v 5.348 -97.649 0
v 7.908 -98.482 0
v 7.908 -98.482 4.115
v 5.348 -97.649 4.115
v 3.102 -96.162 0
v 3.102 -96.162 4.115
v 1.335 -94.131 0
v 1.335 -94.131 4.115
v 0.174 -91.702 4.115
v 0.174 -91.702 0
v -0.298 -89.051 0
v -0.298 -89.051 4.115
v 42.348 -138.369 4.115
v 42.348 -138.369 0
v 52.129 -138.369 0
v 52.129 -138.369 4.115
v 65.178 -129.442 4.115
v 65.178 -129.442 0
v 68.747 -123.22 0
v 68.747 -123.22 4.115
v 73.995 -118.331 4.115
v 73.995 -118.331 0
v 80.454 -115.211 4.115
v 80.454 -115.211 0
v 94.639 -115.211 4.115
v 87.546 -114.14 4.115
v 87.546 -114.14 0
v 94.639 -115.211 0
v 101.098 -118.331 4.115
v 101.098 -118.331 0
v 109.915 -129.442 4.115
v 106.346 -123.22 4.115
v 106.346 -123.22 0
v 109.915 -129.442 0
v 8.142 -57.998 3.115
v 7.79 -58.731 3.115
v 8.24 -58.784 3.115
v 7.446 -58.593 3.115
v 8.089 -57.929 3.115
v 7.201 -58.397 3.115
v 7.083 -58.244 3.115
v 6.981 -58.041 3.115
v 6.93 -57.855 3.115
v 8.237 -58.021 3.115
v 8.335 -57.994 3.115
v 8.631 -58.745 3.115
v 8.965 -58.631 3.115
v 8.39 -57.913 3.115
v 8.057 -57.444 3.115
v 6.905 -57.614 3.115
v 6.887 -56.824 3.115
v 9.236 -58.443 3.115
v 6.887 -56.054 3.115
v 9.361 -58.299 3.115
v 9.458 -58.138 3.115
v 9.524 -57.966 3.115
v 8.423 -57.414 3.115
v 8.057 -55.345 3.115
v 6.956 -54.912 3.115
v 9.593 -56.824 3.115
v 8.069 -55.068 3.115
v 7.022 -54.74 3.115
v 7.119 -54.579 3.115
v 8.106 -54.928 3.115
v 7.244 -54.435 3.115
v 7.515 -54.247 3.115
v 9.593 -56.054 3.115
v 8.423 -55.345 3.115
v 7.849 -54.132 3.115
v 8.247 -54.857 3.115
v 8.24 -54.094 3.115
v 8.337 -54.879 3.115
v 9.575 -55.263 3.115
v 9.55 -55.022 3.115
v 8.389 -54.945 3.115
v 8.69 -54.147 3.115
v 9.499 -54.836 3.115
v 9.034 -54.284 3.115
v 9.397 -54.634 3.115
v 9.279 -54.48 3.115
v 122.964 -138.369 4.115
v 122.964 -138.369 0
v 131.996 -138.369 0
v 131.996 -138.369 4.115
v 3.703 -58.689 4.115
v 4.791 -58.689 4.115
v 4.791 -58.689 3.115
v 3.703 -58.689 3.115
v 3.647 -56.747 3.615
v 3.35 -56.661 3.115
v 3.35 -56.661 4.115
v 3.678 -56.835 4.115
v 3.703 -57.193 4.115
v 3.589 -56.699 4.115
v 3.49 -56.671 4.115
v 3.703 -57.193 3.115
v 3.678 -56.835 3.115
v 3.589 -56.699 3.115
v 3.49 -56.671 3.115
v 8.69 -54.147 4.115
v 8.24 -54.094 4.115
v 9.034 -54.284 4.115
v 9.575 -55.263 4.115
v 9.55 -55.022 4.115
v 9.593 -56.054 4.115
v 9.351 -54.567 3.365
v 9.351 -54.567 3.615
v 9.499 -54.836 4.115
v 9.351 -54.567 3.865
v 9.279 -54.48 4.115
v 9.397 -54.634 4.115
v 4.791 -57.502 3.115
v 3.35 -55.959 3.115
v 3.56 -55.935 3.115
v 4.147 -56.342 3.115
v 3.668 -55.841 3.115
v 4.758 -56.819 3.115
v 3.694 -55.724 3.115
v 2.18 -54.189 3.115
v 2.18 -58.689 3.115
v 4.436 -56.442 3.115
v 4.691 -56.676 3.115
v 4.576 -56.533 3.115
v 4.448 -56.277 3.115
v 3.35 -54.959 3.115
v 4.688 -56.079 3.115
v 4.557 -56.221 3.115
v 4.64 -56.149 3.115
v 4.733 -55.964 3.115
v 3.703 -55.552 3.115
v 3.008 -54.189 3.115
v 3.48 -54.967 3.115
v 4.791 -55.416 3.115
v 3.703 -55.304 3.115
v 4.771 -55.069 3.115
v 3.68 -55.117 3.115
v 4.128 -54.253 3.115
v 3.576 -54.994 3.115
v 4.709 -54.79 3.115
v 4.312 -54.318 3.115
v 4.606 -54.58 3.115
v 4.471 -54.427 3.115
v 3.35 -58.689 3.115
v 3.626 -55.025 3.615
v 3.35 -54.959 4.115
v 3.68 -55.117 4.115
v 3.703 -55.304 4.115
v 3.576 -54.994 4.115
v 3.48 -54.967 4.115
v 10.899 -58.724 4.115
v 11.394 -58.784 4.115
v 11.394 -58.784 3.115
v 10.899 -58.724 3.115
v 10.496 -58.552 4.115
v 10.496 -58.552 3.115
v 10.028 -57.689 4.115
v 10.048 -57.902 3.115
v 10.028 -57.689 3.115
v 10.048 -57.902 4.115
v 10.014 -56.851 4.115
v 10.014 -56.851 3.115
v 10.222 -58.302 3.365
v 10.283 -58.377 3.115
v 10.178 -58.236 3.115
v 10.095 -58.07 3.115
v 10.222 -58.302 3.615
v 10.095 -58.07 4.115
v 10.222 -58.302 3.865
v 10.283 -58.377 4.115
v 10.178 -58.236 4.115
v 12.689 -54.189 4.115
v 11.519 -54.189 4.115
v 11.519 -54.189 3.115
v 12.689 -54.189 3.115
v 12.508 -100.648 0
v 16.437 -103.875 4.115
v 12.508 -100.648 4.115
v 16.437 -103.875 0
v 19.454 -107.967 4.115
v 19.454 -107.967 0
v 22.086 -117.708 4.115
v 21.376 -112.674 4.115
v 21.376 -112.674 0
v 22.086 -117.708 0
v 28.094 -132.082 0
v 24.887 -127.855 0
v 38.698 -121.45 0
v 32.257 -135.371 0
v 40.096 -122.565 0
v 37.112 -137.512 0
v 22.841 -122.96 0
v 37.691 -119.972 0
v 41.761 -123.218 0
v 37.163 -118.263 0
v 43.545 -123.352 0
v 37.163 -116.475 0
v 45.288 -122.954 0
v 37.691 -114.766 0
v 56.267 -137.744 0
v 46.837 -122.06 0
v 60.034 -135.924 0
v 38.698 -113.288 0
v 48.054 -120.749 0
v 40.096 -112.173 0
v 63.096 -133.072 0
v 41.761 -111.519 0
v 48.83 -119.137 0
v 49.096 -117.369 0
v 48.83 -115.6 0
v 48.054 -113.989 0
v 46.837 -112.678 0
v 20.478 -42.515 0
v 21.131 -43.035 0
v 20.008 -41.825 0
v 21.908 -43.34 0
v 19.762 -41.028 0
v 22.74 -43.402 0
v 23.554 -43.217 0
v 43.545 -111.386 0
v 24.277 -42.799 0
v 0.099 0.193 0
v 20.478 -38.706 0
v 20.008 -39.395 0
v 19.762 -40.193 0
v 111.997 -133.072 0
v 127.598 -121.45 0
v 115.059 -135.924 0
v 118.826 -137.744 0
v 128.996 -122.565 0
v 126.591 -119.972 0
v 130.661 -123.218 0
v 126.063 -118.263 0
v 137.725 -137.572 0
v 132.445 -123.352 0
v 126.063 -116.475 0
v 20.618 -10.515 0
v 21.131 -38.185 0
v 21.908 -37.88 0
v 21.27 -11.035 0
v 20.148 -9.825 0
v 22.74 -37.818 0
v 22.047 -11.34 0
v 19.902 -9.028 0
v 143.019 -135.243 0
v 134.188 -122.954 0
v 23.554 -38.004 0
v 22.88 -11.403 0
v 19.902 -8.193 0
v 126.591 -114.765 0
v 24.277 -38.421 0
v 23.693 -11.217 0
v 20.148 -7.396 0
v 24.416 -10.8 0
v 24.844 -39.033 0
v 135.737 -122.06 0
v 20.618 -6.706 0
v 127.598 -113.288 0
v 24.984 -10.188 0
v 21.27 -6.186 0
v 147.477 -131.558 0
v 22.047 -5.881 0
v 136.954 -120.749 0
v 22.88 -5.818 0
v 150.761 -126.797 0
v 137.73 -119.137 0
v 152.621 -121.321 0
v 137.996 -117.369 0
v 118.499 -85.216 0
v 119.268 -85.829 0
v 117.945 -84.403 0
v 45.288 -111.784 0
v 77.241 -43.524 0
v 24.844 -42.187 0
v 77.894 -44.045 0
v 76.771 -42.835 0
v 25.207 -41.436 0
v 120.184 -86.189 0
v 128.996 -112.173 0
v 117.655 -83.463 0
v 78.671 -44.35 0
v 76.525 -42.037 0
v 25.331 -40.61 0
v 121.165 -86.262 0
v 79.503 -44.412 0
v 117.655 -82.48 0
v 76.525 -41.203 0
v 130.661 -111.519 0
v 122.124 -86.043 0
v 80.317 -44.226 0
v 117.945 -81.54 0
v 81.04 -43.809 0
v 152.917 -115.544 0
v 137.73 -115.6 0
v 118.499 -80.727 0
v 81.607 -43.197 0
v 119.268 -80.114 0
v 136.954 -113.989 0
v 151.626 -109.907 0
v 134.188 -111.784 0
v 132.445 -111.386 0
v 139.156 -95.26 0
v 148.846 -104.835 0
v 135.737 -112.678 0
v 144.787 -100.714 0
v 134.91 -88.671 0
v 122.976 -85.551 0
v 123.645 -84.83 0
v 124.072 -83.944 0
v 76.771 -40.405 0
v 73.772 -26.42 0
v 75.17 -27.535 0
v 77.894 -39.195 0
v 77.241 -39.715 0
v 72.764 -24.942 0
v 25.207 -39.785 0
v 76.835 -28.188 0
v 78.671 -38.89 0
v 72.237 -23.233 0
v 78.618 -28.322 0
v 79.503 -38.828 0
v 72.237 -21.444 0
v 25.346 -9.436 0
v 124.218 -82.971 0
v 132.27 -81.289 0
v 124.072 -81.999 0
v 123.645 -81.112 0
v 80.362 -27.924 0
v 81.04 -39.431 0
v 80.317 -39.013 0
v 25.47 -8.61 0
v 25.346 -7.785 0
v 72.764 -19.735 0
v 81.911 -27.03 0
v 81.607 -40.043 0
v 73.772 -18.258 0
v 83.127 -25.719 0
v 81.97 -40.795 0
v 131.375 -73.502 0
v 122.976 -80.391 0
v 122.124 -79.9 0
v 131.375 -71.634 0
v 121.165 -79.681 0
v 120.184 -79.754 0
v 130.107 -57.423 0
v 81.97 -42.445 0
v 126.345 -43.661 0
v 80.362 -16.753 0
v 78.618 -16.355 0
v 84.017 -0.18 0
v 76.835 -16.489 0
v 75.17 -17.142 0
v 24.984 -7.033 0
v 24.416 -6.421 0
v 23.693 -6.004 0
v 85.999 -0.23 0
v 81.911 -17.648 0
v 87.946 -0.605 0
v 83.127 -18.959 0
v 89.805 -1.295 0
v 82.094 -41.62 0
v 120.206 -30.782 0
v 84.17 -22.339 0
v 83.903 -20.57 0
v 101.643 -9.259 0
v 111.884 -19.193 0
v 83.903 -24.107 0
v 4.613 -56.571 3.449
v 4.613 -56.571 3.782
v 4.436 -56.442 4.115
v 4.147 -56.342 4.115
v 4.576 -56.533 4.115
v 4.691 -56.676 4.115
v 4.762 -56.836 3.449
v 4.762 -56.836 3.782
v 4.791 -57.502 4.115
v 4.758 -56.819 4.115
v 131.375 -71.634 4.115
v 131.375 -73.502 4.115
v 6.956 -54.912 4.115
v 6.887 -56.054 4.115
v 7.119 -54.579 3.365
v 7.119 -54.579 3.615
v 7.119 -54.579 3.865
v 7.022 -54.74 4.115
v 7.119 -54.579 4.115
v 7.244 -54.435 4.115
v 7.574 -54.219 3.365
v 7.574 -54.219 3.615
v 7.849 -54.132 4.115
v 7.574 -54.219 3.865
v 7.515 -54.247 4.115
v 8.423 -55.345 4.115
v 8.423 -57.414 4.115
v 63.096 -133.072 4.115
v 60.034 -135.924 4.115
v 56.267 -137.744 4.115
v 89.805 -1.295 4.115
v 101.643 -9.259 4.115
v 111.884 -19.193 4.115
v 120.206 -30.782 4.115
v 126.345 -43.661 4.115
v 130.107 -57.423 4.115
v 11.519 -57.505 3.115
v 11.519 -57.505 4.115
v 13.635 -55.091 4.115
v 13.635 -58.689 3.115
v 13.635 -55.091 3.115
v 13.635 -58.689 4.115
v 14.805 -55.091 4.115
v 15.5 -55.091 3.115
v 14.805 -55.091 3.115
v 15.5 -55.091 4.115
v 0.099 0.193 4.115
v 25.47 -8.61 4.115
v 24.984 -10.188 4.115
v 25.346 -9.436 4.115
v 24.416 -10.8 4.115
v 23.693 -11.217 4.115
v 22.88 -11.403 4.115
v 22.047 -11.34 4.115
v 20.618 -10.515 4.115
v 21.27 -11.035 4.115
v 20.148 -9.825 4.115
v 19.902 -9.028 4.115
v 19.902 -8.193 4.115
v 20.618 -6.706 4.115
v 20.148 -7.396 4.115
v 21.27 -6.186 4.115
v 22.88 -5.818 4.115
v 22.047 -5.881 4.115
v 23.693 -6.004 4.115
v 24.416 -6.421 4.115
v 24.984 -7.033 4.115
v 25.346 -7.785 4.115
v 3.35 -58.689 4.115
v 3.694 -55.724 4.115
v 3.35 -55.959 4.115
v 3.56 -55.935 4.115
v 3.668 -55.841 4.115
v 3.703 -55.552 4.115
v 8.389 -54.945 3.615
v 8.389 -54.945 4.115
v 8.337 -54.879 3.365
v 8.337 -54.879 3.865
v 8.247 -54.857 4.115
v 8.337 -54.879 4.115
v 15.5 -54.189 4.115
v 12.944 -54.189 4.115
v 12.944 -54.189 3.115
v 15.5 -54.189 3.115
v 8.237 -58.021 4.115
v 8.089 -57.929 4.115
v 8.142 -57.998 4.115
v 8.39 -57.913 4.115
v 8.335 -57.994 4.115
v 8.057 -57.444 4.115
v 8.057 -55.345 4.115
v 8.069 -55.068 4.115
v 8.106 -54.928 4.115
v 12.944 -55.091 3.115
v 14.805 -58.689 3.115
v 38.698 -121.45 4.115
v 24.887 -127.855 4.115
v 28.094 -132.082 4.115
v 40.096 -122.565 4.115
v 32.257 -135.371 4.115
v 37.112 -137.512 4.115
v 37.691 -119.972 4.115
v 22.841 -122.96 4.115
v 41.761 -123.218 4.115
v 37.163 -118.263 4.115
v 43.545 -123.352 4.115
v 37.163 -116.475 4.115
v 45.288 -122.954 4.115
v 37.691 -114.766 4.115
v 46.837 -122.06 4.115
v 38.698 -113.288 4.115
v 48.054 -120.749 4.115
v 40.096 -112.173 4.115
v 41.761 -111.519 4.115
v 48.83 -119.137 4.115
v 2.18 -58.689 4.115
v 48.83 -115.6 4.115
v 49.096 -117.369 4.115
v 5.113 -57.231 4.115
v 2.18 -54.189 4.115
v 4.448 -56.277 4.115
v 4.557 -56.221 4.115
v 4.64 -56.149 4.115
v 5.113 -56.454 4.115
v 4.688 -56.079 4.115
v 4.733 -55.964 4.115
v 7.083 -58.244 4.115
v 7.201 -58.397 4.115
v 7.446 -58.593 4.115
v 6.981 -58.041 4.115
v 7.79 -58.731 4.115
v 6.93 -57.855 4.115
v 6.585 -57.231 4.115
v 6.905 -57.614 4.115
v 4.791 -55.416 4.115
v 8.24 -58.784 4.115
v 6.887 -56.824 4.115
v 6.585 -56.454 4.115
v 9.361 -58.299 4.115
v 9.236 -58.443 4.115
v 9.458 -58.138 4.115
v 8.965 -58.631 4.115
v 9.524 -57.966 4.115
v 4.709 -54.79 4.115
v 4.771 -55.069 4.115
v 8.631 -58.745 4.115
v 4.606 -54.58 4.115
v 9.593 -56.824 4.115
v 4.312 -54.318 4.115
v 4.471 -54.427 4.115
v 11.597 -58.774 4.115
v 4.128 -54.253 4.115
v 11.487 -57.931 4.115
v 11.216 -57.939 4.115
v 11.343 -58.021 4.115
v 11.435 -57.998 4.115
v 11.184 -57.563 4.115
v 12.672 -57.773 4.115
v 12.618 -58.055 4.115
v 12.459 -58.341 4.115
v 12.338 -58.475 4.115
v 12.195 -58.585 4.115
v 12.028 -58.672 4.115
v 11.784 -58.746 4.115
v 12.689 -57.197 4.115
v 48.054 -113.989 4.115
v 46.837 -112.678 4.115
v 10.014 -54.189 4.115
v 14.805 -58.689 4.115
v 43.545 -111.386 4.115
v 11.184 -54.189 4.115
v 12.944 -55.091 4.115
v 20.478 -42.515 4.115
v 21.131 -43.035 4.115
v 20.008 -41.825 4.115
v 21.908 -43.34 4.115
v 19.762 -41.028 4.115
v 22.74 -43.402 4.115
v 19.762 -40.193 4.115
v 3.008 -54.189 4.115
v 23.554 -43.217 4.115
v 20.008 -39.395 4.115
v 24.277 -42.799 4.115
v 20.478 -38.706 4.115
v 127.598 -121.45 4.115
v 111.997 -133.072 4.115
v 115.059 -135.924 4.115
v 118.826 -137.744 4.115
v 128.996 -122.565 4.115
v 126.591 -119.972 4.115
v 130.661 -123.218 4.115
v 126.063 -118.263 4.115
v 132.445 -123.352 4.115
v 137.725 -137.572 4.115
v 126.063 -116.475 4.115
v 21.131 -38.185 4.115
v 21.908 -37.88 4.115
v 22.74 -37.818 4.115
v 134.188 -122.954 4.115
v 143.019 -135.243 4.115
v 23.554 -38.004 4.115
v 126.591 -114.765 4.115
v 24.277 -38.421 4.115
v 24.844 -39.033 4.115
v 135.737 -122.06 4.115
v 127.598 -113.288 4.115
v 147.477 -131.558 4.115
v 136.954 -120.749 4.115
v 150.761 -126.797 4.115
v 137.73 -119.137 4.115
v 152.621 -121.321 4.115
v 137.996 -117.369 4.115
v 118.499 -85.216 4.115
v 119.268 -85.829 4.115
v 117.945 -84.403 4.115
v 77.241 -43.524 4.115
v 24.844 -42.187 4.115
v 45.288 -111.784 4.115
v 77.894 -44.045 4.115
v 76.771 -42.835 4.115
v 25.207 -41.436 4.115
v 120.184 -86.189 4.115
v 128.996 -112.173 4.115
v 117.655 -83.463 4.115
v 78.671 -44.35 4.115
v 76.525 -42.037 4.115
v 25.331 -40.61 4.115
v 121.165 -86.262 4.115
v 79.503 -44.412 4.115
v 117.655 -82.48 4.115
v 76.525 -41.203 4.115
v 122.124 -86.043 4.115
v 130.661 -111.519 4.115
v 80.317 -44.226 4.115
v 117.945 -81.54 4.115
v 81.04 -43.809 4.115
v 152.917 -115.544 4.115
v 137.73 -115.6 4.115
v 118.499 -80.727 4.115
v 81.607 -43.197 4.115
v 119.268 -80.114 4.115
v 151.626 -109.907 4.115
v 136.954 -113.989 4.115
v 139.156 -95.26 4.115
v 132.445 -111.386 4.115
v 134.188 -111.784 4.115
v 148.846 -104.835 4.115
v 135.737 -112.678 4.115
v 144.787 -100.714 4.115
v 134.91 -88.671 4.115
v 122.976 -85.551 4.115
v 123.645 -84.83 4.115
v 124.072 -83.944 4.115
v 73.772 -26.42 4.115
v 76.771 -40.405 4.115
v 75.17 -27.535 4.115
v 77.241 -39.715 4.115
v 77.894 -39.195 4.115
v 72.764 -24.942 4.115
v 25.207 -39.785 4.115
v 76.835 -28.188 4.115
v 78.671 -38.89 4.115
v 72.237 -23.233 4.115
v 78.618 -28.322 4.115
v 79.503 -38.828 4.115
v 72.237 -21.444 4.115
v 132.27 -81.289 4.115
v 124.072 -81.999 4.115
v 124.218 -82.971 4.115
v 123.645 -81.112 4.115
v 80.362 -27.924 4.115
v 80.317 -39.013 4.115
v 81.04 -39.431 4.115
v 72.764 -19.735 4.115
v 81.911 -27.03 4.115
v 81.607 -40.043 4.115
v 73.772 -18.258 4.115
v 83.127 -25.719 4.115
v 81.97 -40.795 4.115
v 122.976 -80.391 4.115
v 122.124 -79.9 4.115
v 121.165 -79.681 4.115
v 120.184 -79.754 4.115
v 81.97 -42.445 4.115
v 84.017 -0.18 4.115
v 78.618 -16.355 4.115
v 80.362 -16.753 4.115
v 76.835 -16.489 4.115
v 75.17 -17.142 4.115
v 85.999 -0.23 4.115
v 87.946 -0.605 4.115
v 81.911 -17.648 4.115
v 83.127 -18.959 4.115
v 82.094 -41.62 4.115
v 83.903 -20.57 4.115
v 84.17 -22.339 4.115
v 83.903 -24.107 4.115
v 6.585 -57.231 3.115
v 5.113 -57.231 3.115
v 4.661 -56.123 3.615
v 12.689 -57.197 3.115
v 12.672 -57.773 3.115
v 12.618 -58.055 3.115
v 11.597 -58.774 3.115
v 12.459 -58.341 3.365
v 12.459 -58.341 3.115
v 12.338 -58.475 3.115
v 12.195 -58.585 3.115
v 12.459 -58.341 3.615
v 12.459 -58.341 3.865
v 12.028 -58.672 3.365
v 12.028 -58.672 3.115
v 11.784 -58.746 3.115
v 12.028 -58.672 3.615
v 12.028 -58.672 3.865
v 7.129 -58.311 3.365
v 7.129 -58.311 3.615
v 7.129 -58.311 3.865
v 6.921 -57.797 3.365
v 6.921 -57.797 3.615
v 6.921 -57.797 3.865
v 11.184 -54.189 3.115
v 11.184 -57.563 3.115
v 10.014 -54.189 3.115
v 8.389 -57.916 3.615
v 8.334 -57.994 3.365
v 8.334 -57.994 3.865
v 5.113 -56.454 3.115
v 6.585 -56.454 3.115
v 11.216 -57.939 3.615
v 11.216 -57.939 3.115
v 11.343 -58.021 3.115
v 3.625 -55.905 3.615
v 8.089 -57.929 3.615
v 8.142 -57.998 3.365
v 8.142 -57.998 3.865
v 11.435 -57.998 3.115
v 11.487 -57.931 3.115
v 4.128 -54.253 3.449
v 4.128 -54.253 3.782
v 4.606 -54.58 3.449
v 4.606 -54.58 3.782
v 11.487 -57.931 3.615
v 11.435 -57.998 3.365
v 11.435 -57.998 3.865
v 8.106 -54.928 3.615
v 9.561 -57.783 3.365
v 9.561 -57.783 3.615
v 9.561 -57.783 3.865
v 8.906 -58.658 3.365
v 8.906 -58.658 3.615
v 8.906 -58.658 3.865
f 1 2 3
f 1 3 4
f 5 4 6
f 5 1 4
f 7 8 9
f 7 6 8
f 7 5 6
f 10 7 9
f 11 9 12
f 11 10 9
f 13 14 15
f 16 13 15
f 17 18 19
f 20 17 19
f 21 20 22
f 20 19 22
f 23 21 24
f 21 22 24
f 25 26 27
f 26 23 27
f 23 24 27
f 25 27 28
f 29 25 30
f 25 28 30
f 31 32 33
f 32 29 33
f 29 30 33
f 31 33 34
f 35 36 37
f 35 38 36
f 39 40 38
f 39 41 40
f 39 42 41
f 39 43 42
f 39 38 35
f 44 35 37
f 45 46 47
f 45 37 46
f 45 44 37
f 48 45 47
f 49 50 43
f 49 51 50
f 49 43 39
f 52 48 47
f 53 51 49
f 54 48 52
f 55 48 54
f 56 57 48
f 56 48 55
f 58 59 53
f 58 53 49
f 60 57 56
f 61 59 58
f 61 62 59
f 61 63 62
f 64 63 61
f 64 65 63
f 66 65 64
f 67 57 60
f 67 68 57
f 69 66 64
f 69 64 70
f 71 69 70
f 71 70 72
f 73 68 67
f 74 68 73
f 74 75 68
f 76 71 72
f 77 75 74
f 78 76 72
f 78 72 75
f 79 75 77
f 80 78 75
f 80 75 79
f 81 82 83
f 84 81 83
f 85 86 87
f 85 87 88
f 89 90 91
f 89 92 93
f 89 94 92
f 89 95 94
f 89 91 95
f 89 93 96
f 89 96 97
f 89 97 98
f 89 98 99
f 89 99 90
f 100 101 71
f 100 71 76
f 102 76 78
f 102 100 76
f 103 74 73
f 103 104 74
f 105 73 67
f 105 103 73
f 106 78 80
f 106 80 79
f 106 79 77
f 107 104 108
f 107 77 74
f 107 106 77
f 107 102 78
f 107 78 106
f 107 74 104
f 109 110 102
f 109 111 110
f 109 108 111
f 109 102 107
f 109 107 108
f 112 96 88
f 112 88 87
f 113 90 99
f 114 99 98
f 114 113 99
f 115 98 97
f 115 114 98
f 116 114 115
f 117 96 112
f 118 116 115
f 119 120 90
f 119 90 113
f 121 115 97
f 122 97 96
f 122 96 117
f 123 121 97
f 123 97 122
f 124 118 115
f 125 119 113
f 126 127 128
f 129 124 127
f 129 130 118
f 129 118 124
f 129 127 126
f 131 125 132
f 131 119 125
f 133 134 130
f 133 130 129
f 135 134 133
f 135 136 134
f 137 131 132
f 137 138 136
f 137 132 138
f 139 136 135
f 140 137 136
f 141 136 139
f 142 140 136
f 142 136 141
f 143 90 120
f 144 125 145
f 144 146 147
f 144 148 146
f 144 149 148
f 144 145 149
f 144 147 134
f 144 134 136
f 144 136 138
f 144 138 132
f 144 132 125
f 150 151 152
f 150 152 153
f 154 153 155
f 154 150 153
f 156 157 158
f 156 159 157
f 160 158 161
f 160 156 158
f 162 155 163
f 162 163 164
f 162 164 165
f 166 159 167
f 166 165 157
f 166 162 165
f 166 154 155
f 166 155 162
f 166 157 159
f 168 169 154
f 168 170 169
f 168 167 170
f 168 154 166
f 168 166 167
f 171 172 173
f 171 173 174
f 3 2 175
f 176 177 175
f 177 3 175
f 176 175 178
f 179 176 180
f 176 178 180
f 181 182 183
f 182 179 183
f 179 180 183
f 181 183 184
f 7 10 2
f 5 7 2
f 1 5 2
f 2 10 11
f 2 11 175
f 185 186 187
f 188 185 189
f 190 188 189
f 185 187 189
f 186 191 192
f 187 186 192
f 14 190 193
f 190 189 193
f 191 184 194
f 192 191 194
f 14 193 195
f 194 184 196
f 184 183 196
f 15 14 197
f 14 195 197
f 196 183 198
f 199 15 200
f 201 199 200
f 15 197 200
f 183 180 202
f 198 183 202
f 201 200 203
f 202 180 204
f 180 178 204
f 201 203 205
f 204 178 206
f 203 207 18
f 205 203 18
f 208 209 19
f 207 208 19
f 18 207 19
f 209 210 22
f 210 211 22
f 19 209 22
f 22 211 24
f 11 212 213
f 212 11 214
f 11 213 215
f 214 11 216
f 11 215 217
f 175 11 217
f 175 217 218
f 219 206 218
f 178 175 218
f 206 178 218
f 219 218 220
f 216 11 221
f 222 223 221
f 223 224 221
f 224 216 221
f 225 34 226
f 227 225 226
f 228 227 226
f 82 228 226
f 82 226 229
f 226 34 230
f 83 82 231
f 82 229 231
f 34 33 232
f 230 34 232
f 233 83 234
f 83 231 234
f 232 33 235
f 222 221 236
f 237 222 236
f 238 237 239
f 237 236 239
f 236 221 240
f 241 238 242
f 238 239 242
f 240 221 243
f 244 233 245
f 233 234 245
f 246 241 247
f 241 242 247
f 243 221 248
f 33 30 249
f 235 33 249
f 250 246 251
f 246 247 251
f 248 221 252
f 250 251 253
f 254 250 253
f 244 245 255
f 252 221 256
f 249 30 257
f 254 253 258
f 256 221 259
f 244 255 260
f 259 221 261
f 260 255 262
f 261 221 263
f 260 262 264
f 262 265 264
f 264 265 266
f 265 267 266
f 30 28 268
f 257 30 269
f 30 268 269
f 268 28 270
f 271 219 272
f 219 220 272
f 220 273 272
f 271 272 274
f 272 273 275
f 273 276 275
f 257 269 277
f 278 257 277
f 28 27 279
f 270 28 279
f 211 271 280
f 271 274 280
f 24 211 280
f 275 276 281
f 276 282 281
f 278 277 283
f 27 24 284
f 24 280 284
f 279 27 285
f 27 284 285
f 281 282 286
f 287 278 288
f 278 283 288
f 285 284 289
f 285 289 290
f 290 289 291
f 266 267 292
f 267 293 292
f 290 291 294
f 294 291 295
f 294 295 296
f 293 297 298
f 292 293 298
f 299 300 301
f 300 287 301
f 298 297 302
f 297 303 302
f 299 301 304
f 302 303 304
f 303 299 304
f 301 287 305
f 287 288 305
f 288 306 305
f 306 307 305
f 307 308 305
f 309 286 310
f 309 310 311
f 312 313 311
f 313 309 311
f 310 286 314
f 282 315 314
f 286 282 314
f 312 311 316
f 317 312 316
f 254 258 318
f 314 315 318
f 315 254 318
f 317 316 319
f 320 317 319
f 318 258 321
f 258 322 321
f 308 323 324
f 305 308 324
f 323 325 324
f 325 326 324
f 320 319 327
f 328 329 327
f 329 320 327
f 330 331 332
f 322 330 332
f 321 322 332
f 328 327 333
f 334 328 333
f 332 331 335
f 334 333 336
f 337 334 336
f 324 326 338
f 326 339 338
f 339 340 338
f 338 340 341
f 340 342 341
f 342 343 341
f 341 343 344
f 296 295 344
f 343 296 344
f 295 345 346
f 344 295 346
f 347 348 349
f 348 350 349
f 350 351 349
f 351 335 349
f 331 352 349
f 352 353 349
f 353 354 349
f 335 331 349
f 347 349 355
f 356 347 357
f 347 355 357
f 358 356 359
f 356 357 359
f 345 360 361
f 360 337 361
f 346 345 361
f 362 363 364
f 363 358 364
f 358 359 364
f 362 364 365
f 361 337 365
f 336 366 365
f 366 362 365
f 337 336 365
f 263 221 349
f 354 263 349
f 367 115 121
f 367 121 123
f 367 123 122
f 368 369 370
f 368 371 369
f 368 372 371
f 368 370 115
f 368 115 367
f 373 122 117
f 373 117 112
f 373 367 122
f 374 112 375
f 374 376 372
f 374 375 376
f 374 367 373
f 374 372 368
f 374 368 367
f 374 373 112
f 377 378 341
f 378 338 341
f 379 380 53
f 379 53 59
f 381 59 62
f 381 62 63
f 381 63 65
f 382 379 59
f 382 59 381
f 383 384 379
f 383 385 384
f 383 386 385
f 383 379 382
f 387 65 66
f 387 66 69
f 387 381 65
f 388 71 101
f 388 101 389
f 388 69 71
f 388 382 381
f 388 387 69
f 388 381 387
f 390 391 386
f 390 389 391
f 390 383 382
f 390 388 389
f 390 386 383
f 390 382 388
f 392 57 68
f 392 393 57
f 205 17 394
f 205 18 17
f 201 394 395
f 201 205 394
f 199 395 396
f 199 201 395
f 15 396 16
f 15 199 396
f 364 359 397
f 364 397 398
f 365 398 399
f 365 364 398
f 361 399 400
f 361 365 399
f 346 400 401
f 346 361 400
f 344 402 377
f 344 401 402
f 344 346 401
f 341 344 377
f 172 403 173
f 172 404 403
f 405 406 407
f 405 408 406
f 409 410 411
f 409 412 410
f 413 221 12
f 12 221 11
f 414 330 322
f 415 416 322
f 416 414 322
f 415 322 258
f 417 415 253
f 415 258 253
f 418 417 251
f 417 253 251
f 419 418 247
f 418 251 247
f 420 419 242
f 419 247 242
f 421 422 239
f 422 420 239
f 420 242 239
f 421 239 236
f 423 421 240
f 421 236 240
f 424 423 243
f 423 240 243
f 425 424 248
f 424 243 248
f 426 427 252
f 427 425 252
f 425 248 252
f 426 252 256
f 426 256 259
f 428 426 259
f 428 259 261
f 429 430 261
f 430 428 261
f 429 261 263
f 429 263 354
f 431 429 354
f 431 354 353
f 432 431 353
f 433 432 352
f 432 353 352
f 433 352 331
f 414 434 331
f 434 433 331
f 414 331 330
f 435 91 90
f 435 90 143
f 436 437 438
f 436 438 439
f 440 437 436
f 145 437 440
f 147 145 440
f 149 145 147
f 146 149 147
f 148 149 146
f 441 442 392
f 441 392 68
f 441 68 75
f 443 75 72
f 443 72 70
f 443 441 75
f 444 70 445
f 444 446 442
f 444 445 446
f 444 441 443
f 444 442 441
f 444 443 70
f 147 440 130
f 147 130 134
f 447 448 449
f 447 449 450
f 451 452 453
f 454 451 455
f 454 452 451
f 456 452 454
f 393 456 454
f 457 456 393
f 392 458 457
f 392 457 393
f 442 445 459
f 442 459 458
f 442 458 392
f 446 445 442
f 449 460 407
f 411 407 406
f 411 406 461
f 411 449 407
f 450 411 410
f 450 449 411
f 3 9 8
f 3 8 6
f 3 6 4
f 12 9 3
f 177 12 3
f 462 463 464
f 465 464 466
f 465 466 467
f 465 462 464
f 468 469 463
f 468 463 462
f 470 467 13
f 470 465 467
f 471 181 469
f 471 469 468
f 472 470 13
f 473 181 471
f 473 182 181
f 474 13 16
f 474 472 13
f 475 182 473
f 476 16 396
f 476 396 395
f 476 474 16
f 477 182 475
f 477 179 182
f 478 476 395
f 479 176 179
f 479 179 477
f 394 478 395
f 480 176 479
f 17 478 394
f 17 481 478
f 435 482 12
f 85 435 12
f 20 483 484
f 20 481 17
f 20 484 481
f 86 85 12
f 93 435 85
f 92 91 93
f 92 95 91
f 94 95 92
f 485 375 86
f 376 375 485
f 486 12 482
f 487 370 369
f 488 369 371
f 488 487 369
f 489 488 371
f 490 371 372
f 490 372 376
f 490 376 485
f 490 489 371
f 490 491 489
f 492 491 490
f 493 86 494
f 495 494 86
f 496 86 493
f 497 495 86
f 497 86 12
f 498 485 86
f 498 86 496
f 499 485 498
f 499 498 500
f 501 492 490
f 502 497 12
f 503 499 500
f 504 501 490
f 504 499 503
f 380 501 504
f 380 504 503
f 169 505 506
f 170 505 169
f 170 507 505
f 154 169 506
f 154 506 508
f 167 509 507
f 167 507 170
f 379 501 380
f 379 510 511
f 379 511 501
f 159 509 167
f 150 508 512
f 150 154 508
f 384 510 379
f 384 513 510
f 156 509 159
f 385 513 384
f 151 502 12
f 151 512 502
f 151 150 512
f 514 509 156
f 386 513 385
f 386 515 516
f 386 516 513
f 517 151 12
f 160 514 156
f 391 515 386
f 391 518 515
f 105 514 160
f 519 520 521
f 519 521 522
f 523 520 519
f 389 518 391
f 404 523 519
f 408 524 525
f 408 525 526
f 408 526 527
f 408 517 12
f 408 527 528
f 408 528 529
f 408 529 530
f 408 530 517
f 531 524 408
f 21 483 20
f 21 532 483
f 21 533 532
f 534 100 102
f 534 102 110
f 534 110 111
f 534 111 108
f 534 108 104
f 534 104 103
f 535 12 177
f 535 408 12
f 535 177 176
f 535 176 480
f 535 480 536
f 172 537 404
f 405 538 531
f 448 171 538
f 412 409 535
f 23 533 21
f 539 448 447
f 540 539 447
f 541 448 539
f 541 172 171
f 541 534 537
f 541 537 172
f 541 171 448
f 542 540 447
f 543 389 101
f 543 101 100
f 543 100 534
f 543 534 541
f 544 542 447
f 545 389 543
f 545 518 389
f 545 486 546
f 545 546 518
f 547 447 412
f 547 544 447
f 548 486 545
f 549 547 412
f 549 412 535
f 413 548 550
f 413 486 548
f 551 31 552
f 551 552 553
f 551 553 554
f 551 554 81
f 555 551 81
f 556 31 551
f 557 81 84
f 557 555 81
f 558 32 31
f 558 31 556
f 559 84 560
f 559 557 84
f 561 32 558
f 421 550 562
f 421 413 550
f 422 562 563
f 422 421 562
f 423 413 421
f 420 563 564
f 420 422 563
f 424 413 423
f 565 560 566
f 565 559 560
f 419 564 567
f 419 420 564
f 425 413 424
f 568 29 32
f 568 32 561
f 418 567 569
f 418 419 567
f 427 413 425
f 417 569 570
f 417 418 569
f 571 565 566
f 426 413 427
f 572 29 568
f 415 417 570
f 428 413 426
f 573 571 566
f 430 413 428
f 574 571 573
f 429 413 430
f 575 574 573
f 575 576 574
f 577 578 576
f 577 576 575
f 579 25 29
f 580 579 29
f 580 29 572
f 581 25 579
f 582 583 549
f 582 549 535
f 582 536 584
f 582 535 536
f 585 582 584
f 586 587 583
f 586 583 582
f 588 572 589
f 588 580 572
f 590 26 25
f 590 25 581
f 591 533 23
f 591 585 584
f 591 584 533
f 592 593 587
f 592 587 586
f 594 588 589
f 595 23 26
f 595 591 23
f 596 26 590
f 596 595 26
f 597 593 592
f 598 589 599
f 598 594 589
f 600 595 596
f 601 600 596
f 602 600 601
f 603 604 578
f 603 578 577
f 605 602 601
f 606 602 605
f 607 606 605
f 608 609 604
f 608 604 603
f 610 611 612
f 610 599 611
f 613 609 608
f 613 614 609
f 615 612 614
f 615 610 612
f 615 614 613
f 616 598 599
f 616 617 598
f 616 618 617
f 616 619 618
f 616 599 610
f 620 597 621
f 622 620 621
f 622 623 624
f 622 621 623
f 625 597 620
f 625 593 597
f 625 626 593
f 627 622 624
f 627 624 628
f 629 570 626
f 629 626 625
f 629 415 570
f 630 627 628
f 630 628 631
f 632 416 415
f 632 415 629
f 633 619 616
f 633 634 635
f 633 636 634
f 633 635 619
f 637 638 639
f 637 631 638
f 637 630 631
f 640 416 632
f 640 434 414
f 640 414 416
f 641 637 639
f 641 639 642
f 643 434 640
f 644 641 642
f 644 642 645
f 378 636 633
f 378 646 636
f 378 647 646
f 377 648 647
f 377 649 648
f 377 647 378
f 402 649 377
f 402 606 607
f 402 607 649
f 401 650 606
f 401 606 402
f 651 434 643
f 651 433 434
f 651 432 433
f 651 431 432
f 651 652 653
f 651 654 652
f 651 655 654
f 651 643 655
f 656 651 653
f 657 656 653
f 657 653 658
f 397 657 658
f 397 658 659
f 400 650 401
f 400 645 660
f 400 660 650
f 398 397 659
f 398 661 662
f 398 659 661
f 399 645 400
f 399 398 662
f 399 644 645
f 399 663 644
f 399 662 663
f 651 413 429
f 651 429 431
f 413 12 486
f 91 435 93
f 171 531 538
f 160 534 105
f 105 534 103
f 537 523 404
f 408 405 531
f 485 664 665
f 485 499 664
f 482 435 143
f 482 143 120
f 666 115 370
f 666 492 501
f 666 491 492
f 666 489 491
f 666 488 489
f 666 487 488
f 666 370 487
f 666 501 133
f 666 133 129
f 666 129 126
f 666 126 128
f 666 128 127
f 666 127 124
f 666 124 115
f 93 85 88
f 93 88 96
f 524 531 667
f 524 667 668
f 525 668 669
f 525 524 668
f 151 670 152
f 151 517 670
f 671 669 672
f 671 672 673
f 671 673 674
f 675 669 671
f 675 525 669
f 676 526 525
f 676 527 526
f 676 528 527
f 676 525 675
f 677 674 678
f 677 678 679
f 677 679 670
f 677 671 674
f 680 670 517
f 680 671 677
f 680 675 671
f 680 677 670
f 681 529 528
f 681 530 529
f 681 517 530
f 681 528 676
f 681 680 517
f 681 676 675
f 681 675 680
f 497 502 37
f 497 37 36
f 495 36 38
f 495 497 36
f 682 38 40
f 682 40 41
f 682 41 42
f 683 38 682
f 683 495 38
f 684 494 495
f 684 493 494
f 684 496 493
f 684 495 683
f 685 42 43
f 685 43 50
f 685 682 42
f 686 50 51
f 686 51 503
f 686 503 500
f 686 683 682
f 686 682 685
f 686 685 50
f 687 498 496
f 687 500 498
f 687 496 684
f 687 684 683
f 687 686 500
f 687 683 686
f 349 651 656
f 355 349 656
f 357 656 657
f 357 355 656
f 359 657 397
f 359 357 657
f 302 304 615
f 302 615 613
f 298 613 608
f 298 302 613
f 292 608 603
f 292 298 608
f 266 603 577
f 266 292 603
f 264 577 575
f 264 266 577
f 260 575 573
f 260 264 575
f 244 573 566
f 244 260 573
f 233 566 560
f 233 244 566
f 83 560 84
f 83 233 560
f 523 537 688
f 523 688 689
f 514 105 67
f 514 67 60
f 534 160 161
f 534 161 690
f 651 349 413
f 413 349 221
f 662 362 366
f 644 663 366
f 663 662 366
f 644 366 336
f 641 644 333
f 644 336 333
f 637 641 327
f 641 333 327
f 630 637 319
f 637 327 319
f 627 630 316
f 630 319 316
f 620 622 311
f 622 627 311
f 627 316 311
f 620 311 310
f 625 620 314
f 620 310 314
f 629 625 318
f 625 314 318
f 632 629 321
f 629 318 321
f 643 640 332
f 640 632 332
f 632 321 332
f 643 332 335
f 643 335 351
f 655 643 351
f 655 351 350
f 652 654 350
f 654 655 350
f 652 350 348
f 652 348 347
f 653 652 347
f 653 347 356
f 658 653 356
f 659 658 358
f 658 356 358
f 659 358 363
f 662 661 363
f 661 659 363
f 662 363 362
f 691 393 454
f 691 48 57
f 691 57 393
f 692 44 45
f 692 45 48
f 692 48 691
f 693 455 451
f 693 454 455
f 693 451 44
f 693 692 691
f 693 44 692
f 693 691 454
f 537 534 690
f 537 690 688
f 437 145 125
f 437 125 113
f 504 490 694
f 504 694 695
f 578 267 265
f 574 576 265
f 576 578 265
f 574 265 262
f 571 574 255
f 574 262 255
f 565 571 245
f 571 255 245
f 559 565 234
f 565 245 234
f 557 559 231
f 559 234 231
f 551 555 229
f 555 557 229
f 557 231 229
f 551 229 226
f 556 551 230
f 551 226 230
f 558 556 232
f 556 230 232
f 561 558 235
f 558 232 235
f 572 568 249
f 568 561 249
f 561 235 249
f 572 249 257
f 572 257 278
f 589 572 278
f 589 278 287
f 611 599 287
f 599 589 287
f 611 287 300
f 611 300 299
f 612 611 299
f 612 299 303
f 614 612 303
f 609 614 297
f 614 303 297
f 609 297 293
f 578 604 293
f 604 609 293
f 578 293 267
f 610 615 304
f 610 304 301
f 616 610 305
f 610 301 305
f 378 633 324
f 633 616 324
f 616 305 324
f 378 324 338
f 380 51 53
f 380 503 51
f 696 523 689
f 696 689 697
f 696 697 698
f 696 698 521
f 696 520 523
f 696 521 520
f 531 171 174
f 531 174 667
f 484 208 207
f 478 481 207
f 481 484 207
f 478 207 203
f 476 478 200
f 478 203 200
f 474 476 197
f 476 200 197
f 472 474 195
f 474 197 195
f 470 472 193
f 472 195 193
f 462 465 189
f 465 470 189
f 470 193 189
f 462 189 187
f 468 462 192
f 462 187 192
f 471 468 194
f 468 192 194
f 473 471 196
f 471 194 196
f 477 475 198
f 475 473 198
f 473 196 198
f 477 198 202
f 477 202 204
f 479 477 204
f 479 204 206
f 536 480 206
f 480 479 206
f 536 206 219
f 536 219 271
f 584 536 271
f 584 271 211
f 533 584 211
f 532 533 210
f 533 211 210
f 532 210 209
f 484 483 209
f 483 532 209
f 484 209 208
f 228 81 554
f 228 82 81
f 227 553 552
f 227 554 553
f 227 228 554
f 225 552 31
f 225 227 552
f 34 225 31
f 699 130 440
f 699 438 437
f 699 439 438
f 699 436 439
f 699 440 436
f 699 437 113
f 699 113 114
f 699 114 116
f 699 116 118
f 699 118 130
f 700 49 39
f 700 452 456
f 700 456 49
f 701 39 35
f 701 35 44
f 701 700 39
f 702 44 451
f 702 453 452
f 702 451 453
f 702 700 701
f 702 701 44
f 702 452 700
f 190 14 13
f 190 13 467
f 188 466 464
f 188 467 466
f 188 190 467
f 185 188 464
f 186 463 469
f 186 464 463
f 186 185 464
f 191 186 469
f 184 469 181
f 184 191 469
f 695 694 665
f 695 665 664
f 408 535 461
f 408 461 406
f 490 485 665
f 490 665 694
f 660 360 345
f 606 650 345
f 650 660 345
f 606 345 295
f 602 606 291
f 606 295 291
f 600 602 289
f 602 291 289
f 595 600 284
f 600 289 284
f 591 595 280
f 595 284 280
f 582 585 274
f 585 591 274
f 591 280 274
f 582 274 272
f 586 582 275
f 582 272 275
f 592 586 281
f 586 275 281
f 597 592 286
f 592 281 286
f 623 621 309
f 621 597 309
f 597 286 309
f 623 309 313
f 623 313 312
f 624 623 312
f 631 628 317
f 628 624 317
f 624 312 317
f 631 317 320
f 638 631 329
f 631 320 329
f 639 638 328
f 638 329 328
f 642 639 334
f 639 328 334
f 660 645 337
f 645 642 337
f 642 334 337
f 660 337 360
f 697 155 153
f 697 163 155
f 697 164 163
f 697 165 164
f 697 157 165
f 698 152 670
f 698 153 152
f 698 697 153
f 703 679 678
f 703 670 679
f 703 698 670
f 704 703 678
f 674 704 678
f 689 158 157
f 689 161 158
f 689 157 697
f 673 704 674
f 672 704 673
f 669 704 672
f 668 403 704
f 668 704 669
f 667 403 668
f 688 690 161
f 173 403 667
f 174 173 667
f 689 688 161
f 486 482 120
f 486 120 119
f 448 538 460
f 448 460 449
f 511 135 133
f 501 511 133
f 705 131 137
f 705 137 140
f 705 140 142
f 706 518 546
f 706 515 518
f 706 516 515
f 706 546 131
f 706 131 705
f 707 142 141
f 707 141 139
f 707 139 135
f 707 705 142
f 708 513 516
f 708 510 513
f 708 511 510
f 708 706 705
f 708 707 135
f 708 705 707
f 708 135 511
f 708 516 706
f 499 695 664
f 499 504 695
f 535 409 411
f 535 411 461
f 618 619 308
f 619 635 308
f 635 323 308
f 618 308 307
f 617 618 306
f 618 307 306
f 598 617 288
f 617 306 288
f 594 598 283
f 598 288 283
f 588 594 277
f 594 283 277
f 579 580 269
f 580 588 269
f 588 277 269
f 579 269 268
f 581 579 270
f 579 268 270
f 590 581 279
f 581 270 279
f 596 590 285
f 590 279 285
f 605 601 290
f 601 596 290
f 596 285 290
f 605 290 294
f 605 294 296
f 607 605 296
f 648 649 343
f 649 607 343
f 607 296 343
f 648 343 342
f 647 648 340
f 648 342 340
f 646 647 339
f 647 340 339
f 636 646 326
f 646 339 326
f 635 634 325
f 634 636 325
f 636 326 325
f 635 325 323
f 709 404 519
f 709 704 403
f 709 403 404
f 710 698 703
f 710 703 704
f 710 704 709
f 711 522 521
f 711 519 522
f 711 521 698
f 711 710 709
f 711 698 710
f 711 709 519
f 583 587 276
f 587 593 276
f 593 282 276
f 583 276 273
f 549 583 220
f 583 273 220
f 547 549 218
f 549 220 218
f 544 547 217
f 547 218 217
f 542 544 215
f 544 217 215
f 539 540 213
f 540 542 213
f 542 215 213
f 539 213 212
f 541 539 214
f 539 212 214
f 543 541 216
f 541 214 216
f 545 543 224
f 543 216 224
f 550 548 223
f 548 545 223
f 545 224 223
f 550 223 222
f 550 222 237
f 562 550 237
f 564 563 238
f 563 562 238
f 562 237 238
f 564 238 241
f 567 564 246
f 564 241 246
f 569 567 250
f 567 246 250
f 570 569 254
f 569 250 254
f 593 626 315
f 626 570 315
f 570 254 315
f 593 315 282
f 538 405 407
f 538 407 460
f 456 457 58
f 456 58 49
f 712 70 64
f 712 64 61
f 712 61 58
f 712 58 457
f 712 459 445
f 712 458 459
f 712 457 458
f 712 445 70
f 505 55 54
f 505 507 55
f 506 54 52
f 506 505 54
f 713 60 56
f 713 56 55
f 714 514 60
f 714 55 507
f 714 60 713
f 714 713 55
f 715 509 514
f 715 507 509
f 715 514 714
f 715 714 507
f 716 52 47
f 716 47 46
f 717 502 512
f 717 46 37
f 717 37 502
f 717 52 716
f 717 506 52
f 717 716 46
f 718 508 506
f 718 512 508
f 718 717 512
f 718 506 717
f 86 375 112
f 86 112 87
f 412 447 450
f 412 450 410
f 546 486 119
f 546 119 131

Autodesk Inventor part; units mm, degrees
ref_plane "YZ Plane" through (0, 0, 0) normal (1, 0, 0) x (0, 1, 0)
ref_plane "XZ Plane" through (0, 0, 0) normal (0, 1, 0) x (-1, 0, 0)
ref_plane "XY Plane" through (0, 0, 0) normal (0, 0, 1) x (1, 0, 0)
sketch "Sketch1" plane through (0, 0, 0) normal (0, 0, 1) x (1, 0, 0)
  line L0 (131.3749, -73.5016) -> (131.3749, -71.6344)
  arc A0 (131.3749, -71.6344) -> (89.8052, -1.2952) centre (51.0805, -71.6344) ccw
  arc A1 (89.8052, -1.2952) -> (84.0169, -0.1805) centre (84.7113, -12.1604) ccw
  line L1 (84.0169, -0.1805) -> (0.0993, 0.1926)
  line L2 (0.0993, 0.1926) -> (-0.2975, -89.0508)
  arc A2 (-0.2975, -89.0508) -> (7.9081, -98.4818) centre (9.6942, -88.6426) ccw
  circle A3 centre (120.9184, -82.9714) radius 3.3
  arc A4 (145.7873, -114.287) -> (148.0883, -110.4202) centre (146.9636, -112.3689) ccw
  arc A5 (145.7873, -124.287) -> (148.0882, -120.4202) centre (146.9636, -122.3689) ccw
  circle A6 centre (22.531, -40.6102) radius 2.8
  circle A7 centre (28.6758, -122.3689) radius 2.25
  circle A8 centre (28.6758, -112.3689) radius 2.25
  circle A9 centre (10, -88.6441) radius 3.3
  arc A10 (32.2446, -127.2916) -> (33.2446, -128.2916) centre (33.2446, -127.2916) ccw
  line L3 (32.2446, -127.2916) -> (32.2446, -107.4916)
  arc A11 (33.2446, -106.4916) -> (32.2446, -107.4916) centre (33.2446, -107.4916) ccw
  arc A12 (142.8483, -107.4916) -> (141.8483, -106.4916) centre (141.8483, -107.4916) ccw
  line L4 (142.8483, -107.4916) -> (142.8483, -127.2916)
  arc A13 (141.8483, -128.2916) -> (142.8483, -127.2916) centre (141.8483, -127.2916) ccw
  circle A14 centre (146.9636, -112.3689) radius 2.25
  circle A15 centre (146.9636, -122.3689) radius 2.25
  circle A16 centre (43.0964, -117.3689) radius 6
  circle A17 centre (131.9964, -117.3688) radius 6
  circle A18 centre (78.1699, -22.3386) radius 3.25
  circle A19 centre (78.1699, -22.3386) radius 6
  arc A20 (131.9964, -138.3688) -> (144.7874, -100.7138) centre (131.9964, -117.3688) ccw
  arc A21 (22.0858, -117.7084) -> (7.9081, -98.4818) centre (1.5094, -118.0409) ccw
  arc A22 (131.3749, -73.5016) -> (144.7874, -100.7138) centre (165.6862, -73.5016) ccw
  arc A23 (22.0858, -117.7084) -> (42.3476, -138.3689) centre (43.0964, -117.3689) ccw
  arc A24 (109.9151, -129.4423) -> (65.1778, -129.4423) centre (87.5464, -138.1396) ccw
  line L5 (42.3476, -138.3689) -> (52.1294, -138.3689)
  line L6 (122.9635, -138.3688) -> (131.9964, -138.3688)
  arc A25 (52.1294, -138.3689) -> (65.1778, -129.4423) centre (52.1294, -124.3689) ccw
  arc A26 (109.9151, -129.4423) -> (122.9635, -138.3688) centre (122.9635, -124.3688) ccw
  circle A27 centre (43.0964, -117.3689) radius 4.6 projected
  line L7 (1.9461, -54.0938) -> (33.2975, -54.0938) construction
  line L8 (33.2975, -54.0938) -> (33.2975, -61.1615) construction
  line L9 (33.2975, -61.1615) -> (1.9461, -61.1615) construction
  line L10 (1.9461, -61.1615) -> (1.9461, -54.0938) construction
  circle A28 centre (79.294, -41.6199) radius 2.8
  circle A29 centre (78.1699, -22.3386) radius 6
  circle A30 centre (22.531, -40.6102) radius 2.8
  circle A31 centre (22.6705, -8.6105) radius 2.8
  circle A32 centre (22.6705, -8.6105) radius 2.8
  circle A33 centre (120.9184, -82.9714) radius 3.3
  line L11 (2.1801, -54.1888) -> (3.0075, -54.1888)
  spline S0 degree 2 poles (3.0075, -54.1888) (3.8349, -54.1888) (4.4216, -54.3176) (4.7912, -54.8433) (4.7912, -55.4164) knots 0 0 0 1 2 3 3 3
  spline S1 degree 2 poles (4.7912, -55.4164) (4.7912, -55.942) (4.5301, -56.3048) (4.1469, -56.3421) knots 0 0 0 1 2 2 2
  spline S2 degree 2 poles (4.1469, -56.3421) (4.4928, -56.4269) (4.7336, -56.7152) (4.7912, -56.9559) (4.7912, -57.5019) knots 0 0 0 1 2 3 3 3
  line L12 (4.7912, -57.5019) -> (4.7912, -58.6888)
  line L13 (4.7912, -58.6888) -> (3.7027, -58.6888)
  line L14 (3.7027, -58.6888) -> (3.7027, -57.1933)
  spline S3 degree 2 poles (3.7027, -57.1933) (3.7027, -56.8338) (3.5908, -56.6609) (3.35, -56.6609) knots 0 0 0 1 2 2 2
  line L15 (3.35, -56.6609) -> (3.35, -58.6888)
  line L16 (3.35, -58.6888) -> (2.1801, -58.6888)
  line L17 (2.1801, -58.6888) -> (2.1801, -54.1888)
  line L18 (3.35, -54.9586) -> (3.35, -55.9589)
  spline S4 degree 2 poles (3.35, -55.9589) (3.5467, -55.9589) (3.7027, -55.8504) (3.7027, -55.552) knots 0 0 0 1 2 2 2
  line L19 (3.7027, -55.552) -> (3.7027, -55.3045)
  spline S5 degree 2 poles (3.7027, -55.3045) (3.7027, -55.0908) (3.5501, -54.9586) (3.35, -54.9586) knots 0 0 0 1 2 2 2
  line L20 (6.5851, -56.454) -> (6.5851, -57.2306)
  line L21 (6.5851, -57.2306) -> (5.1134, -57.2306)
  line L22 (5.1134, -57.2306) -> (5.1134, -56.454)
  line L23 (5.1134, -56.454) -> (6.5851, -56.454)
  spline S6 degree 2 poles (9.593, -56.8237) (9.593, -57.5019) (9.5286, -58.0648) (9.1929, -58.5328) (8.6198, -58.7837) (8.24, -58.7837) knots 0 0 0 1 2 3 4 4 4
  spline S7 degree 2 poles (8.24, -58.7837) (7.8771, -58.7837) (7.304, -58.5464) (6.9548, -58.075) (6.8869, -57.5189) (6.8869, -56.8237) knots 0 0 0 1 2 3 4 4 4
  line L24 (6.8869, -56.8237) -> (6.8869, -56.0539)
  spline S8 degree 2 poles (6.8869, -56.0539) (6.8869, -55.3757) (6.9514, -54.8127) (7.2871, -54.3448) (7.8602, -54.0938) (8.24, -54.0938) knots 0 0 0 1 2 3 4 4 4
  spline S9 degree 2 poles (8.24, -54.0938) (8.6028, -54.0938) (9.1759, -54.3312) (9.5252, -54.8026) (9.593, -55.3587) (9.593, -56.0539) knots 0 0 0 1 2 3 4 4 4
  line L25 (9.593, -56.0539) -> (9.593, -56.8237)
  spline S10 degree 2 poles (8.4231, -55.3452) (8.4231, -55.0332) (8.3553, -54.8568) (8.2468, -54.8568) knots 0 0 0 1 2 2 2
  spline S11 degree 2 poles (8.2468, -54.8568) (8.1552, -54.8568) (8.0569, -54.9993) (8.0569, -55.3452) knots 0 0 0 1 2 2 2
  line L26 (8.0569, -55.3452) -> (8.0569, -57.4442)
  spline S12 degree 2 poles (8.0569, -57.4442) (8.0569, -57.8376) (8.1213, -58.0207) (8.2366, -58.0207) knots 0 0 0 1 2 2 2
  spline S13 degree 2 poles (8.2366, -58.0207) (8.3553, -58.0207) (8.4231, -57.8105) (8.4231, -57.4137) knots 0 0 0 1 2 2 2
  line L27 (8.4231, -57.4137) -> (8.4231, -55.3452)
  line L28 (12.6891, -54.1888) -> (12.6891, -57.1967)
  spline S14 degree 2 poles (12.6891, -57.1967) (12.6891, -57.7088) (12.6213, -58.1225) (12.2958, -58.5599) (11.76, -58.7837) (11.3937, -58.7837) knots 0 0 0 1 2 3 4 4 4
  spline S15 degree 2 poles (11.3937, -58.7837) (10.9902, -58.7837) (10.3764, -58.5158) (10.0678, -58.0886) (10.0135, -57.6138) (10.0135, -56.8508) knots 0 0 0 1 2 3 4 4 4
  line L29 (10.0135, -56.8508) -> (10.0135, -54.1888)
  line L30 (10.0135, -54.1888) -> (11.1835, -54.1888)
  line L31 (11.1835, -54.1888) -> (11.1835, -57.5629)
  spline S16 degree 2 poles (11.1835, -57.5629) (11.1835, -57.858) (11.2479, -58.0207) (11.3429, -58.0207) knots 0 0 0 1 2 2 2
  spline S17 degree 2 poles (11.3429, -58.0207) (11.4548, -58.0207) (11.5192, -57.841) (11.5192, -57.5053) knots 0 0 0 1 2 2 2
  line L32 (11.5192, -57.5053) -> (11.5192, -54.1888)
  line L33 (11.5192, -54.1888) -> (12.6891, -54.1888)
  line L34 (15.5004, -54.1888) -> (15.5004, -55.0908)
  line L35 (15.5004, -55.0908) -> (14.8052, -55.0908)
  line L36 (14.8052, -55.0908) -> (14.8052, -58.6888)
  line L37 (14.8052, -58.6888) -> (13.6352, -58.6888)
  line L38 (13.6352, -58.6888) -> (13.6352, -55.0908)
  line L39 (13.6352, -55.0908) -> (12.9435, -55.0908)
  line L40 (12.9435, -55.0908) -> (12.9435, -54.1888)
  line L41 (12.9435, -54.1888) -> (15.5004, -54.1888)
  point P0 (0, 0)
  point P1 (58.8546, -117.3689)
  point P2 (63.5475, -138.3689)
  point P3 (111.5453, -138.3689)
  dimension "d6" = 10
  dimension "d7" = 12
  dimension "d10" = 88.9
  dimension "d11" = 42
  dimension "d13" = 10.8518
  dimension "d14" = 10.8518
  dimension "d16" = 4.1153
  dimension "d17" = 4.1153
  dimension "d18" = 48
  dimension "d19" = 14
  dimension "d20" = 44.45
  dimension "d23" = 5.6
  dimension "d25" = 56.763
  dimension "d26" = 19.314
  dimension "d27" = 78.17
extrude "Extrusion1" add sketch "Sketch1" along normal blind 4.1153 contours A22 A20 L6 A26 A24 A25 L5 A23 A21 A2 L2 L1 A1 A0 L0 | A14 A4 | A15 A5 | A7 | A8 | A9 | L11 S0 S1 S2 L12 L13 L14 S3 L15 L16 L17 | S5 L19 S4 L18 | L20 L21 L22 L23 | S6 S7 L24 S8 S9 L25 | L27 S13 S12 L26 S11 S10 | L28 S14 S15 L29 L30 L31 S16 S17 L32 L33 | L34 L35 L36 L37 L38 L39 L40 L41
extrude "Extrusion2" cut sketch "Sketch1" against normal blind 1 from surface at 4.1153 contours L11 S0 S1 S2 L12 L13 L14 S3 L15 L16 L17 | L20 L21 L22 L23 | S6 S7 L24 S8 S9 L25 | L28 S14 S15 L29 L30 L31 S16 S17 L32 L33 | L34 L35 L36 L37 L38 L39 L40 L41
equation "\"d14\" = d13"
equation "\"d16\" = d15"
equation "\"d17\" = d15"
equation "\"d20\" = 0.5 * d10"
equation "\"d0\" = d16"
equation "\"d15\" = 4.115311"
properties part number "Intake Sides V6ipt" material "Polycarbonate, Clear"
